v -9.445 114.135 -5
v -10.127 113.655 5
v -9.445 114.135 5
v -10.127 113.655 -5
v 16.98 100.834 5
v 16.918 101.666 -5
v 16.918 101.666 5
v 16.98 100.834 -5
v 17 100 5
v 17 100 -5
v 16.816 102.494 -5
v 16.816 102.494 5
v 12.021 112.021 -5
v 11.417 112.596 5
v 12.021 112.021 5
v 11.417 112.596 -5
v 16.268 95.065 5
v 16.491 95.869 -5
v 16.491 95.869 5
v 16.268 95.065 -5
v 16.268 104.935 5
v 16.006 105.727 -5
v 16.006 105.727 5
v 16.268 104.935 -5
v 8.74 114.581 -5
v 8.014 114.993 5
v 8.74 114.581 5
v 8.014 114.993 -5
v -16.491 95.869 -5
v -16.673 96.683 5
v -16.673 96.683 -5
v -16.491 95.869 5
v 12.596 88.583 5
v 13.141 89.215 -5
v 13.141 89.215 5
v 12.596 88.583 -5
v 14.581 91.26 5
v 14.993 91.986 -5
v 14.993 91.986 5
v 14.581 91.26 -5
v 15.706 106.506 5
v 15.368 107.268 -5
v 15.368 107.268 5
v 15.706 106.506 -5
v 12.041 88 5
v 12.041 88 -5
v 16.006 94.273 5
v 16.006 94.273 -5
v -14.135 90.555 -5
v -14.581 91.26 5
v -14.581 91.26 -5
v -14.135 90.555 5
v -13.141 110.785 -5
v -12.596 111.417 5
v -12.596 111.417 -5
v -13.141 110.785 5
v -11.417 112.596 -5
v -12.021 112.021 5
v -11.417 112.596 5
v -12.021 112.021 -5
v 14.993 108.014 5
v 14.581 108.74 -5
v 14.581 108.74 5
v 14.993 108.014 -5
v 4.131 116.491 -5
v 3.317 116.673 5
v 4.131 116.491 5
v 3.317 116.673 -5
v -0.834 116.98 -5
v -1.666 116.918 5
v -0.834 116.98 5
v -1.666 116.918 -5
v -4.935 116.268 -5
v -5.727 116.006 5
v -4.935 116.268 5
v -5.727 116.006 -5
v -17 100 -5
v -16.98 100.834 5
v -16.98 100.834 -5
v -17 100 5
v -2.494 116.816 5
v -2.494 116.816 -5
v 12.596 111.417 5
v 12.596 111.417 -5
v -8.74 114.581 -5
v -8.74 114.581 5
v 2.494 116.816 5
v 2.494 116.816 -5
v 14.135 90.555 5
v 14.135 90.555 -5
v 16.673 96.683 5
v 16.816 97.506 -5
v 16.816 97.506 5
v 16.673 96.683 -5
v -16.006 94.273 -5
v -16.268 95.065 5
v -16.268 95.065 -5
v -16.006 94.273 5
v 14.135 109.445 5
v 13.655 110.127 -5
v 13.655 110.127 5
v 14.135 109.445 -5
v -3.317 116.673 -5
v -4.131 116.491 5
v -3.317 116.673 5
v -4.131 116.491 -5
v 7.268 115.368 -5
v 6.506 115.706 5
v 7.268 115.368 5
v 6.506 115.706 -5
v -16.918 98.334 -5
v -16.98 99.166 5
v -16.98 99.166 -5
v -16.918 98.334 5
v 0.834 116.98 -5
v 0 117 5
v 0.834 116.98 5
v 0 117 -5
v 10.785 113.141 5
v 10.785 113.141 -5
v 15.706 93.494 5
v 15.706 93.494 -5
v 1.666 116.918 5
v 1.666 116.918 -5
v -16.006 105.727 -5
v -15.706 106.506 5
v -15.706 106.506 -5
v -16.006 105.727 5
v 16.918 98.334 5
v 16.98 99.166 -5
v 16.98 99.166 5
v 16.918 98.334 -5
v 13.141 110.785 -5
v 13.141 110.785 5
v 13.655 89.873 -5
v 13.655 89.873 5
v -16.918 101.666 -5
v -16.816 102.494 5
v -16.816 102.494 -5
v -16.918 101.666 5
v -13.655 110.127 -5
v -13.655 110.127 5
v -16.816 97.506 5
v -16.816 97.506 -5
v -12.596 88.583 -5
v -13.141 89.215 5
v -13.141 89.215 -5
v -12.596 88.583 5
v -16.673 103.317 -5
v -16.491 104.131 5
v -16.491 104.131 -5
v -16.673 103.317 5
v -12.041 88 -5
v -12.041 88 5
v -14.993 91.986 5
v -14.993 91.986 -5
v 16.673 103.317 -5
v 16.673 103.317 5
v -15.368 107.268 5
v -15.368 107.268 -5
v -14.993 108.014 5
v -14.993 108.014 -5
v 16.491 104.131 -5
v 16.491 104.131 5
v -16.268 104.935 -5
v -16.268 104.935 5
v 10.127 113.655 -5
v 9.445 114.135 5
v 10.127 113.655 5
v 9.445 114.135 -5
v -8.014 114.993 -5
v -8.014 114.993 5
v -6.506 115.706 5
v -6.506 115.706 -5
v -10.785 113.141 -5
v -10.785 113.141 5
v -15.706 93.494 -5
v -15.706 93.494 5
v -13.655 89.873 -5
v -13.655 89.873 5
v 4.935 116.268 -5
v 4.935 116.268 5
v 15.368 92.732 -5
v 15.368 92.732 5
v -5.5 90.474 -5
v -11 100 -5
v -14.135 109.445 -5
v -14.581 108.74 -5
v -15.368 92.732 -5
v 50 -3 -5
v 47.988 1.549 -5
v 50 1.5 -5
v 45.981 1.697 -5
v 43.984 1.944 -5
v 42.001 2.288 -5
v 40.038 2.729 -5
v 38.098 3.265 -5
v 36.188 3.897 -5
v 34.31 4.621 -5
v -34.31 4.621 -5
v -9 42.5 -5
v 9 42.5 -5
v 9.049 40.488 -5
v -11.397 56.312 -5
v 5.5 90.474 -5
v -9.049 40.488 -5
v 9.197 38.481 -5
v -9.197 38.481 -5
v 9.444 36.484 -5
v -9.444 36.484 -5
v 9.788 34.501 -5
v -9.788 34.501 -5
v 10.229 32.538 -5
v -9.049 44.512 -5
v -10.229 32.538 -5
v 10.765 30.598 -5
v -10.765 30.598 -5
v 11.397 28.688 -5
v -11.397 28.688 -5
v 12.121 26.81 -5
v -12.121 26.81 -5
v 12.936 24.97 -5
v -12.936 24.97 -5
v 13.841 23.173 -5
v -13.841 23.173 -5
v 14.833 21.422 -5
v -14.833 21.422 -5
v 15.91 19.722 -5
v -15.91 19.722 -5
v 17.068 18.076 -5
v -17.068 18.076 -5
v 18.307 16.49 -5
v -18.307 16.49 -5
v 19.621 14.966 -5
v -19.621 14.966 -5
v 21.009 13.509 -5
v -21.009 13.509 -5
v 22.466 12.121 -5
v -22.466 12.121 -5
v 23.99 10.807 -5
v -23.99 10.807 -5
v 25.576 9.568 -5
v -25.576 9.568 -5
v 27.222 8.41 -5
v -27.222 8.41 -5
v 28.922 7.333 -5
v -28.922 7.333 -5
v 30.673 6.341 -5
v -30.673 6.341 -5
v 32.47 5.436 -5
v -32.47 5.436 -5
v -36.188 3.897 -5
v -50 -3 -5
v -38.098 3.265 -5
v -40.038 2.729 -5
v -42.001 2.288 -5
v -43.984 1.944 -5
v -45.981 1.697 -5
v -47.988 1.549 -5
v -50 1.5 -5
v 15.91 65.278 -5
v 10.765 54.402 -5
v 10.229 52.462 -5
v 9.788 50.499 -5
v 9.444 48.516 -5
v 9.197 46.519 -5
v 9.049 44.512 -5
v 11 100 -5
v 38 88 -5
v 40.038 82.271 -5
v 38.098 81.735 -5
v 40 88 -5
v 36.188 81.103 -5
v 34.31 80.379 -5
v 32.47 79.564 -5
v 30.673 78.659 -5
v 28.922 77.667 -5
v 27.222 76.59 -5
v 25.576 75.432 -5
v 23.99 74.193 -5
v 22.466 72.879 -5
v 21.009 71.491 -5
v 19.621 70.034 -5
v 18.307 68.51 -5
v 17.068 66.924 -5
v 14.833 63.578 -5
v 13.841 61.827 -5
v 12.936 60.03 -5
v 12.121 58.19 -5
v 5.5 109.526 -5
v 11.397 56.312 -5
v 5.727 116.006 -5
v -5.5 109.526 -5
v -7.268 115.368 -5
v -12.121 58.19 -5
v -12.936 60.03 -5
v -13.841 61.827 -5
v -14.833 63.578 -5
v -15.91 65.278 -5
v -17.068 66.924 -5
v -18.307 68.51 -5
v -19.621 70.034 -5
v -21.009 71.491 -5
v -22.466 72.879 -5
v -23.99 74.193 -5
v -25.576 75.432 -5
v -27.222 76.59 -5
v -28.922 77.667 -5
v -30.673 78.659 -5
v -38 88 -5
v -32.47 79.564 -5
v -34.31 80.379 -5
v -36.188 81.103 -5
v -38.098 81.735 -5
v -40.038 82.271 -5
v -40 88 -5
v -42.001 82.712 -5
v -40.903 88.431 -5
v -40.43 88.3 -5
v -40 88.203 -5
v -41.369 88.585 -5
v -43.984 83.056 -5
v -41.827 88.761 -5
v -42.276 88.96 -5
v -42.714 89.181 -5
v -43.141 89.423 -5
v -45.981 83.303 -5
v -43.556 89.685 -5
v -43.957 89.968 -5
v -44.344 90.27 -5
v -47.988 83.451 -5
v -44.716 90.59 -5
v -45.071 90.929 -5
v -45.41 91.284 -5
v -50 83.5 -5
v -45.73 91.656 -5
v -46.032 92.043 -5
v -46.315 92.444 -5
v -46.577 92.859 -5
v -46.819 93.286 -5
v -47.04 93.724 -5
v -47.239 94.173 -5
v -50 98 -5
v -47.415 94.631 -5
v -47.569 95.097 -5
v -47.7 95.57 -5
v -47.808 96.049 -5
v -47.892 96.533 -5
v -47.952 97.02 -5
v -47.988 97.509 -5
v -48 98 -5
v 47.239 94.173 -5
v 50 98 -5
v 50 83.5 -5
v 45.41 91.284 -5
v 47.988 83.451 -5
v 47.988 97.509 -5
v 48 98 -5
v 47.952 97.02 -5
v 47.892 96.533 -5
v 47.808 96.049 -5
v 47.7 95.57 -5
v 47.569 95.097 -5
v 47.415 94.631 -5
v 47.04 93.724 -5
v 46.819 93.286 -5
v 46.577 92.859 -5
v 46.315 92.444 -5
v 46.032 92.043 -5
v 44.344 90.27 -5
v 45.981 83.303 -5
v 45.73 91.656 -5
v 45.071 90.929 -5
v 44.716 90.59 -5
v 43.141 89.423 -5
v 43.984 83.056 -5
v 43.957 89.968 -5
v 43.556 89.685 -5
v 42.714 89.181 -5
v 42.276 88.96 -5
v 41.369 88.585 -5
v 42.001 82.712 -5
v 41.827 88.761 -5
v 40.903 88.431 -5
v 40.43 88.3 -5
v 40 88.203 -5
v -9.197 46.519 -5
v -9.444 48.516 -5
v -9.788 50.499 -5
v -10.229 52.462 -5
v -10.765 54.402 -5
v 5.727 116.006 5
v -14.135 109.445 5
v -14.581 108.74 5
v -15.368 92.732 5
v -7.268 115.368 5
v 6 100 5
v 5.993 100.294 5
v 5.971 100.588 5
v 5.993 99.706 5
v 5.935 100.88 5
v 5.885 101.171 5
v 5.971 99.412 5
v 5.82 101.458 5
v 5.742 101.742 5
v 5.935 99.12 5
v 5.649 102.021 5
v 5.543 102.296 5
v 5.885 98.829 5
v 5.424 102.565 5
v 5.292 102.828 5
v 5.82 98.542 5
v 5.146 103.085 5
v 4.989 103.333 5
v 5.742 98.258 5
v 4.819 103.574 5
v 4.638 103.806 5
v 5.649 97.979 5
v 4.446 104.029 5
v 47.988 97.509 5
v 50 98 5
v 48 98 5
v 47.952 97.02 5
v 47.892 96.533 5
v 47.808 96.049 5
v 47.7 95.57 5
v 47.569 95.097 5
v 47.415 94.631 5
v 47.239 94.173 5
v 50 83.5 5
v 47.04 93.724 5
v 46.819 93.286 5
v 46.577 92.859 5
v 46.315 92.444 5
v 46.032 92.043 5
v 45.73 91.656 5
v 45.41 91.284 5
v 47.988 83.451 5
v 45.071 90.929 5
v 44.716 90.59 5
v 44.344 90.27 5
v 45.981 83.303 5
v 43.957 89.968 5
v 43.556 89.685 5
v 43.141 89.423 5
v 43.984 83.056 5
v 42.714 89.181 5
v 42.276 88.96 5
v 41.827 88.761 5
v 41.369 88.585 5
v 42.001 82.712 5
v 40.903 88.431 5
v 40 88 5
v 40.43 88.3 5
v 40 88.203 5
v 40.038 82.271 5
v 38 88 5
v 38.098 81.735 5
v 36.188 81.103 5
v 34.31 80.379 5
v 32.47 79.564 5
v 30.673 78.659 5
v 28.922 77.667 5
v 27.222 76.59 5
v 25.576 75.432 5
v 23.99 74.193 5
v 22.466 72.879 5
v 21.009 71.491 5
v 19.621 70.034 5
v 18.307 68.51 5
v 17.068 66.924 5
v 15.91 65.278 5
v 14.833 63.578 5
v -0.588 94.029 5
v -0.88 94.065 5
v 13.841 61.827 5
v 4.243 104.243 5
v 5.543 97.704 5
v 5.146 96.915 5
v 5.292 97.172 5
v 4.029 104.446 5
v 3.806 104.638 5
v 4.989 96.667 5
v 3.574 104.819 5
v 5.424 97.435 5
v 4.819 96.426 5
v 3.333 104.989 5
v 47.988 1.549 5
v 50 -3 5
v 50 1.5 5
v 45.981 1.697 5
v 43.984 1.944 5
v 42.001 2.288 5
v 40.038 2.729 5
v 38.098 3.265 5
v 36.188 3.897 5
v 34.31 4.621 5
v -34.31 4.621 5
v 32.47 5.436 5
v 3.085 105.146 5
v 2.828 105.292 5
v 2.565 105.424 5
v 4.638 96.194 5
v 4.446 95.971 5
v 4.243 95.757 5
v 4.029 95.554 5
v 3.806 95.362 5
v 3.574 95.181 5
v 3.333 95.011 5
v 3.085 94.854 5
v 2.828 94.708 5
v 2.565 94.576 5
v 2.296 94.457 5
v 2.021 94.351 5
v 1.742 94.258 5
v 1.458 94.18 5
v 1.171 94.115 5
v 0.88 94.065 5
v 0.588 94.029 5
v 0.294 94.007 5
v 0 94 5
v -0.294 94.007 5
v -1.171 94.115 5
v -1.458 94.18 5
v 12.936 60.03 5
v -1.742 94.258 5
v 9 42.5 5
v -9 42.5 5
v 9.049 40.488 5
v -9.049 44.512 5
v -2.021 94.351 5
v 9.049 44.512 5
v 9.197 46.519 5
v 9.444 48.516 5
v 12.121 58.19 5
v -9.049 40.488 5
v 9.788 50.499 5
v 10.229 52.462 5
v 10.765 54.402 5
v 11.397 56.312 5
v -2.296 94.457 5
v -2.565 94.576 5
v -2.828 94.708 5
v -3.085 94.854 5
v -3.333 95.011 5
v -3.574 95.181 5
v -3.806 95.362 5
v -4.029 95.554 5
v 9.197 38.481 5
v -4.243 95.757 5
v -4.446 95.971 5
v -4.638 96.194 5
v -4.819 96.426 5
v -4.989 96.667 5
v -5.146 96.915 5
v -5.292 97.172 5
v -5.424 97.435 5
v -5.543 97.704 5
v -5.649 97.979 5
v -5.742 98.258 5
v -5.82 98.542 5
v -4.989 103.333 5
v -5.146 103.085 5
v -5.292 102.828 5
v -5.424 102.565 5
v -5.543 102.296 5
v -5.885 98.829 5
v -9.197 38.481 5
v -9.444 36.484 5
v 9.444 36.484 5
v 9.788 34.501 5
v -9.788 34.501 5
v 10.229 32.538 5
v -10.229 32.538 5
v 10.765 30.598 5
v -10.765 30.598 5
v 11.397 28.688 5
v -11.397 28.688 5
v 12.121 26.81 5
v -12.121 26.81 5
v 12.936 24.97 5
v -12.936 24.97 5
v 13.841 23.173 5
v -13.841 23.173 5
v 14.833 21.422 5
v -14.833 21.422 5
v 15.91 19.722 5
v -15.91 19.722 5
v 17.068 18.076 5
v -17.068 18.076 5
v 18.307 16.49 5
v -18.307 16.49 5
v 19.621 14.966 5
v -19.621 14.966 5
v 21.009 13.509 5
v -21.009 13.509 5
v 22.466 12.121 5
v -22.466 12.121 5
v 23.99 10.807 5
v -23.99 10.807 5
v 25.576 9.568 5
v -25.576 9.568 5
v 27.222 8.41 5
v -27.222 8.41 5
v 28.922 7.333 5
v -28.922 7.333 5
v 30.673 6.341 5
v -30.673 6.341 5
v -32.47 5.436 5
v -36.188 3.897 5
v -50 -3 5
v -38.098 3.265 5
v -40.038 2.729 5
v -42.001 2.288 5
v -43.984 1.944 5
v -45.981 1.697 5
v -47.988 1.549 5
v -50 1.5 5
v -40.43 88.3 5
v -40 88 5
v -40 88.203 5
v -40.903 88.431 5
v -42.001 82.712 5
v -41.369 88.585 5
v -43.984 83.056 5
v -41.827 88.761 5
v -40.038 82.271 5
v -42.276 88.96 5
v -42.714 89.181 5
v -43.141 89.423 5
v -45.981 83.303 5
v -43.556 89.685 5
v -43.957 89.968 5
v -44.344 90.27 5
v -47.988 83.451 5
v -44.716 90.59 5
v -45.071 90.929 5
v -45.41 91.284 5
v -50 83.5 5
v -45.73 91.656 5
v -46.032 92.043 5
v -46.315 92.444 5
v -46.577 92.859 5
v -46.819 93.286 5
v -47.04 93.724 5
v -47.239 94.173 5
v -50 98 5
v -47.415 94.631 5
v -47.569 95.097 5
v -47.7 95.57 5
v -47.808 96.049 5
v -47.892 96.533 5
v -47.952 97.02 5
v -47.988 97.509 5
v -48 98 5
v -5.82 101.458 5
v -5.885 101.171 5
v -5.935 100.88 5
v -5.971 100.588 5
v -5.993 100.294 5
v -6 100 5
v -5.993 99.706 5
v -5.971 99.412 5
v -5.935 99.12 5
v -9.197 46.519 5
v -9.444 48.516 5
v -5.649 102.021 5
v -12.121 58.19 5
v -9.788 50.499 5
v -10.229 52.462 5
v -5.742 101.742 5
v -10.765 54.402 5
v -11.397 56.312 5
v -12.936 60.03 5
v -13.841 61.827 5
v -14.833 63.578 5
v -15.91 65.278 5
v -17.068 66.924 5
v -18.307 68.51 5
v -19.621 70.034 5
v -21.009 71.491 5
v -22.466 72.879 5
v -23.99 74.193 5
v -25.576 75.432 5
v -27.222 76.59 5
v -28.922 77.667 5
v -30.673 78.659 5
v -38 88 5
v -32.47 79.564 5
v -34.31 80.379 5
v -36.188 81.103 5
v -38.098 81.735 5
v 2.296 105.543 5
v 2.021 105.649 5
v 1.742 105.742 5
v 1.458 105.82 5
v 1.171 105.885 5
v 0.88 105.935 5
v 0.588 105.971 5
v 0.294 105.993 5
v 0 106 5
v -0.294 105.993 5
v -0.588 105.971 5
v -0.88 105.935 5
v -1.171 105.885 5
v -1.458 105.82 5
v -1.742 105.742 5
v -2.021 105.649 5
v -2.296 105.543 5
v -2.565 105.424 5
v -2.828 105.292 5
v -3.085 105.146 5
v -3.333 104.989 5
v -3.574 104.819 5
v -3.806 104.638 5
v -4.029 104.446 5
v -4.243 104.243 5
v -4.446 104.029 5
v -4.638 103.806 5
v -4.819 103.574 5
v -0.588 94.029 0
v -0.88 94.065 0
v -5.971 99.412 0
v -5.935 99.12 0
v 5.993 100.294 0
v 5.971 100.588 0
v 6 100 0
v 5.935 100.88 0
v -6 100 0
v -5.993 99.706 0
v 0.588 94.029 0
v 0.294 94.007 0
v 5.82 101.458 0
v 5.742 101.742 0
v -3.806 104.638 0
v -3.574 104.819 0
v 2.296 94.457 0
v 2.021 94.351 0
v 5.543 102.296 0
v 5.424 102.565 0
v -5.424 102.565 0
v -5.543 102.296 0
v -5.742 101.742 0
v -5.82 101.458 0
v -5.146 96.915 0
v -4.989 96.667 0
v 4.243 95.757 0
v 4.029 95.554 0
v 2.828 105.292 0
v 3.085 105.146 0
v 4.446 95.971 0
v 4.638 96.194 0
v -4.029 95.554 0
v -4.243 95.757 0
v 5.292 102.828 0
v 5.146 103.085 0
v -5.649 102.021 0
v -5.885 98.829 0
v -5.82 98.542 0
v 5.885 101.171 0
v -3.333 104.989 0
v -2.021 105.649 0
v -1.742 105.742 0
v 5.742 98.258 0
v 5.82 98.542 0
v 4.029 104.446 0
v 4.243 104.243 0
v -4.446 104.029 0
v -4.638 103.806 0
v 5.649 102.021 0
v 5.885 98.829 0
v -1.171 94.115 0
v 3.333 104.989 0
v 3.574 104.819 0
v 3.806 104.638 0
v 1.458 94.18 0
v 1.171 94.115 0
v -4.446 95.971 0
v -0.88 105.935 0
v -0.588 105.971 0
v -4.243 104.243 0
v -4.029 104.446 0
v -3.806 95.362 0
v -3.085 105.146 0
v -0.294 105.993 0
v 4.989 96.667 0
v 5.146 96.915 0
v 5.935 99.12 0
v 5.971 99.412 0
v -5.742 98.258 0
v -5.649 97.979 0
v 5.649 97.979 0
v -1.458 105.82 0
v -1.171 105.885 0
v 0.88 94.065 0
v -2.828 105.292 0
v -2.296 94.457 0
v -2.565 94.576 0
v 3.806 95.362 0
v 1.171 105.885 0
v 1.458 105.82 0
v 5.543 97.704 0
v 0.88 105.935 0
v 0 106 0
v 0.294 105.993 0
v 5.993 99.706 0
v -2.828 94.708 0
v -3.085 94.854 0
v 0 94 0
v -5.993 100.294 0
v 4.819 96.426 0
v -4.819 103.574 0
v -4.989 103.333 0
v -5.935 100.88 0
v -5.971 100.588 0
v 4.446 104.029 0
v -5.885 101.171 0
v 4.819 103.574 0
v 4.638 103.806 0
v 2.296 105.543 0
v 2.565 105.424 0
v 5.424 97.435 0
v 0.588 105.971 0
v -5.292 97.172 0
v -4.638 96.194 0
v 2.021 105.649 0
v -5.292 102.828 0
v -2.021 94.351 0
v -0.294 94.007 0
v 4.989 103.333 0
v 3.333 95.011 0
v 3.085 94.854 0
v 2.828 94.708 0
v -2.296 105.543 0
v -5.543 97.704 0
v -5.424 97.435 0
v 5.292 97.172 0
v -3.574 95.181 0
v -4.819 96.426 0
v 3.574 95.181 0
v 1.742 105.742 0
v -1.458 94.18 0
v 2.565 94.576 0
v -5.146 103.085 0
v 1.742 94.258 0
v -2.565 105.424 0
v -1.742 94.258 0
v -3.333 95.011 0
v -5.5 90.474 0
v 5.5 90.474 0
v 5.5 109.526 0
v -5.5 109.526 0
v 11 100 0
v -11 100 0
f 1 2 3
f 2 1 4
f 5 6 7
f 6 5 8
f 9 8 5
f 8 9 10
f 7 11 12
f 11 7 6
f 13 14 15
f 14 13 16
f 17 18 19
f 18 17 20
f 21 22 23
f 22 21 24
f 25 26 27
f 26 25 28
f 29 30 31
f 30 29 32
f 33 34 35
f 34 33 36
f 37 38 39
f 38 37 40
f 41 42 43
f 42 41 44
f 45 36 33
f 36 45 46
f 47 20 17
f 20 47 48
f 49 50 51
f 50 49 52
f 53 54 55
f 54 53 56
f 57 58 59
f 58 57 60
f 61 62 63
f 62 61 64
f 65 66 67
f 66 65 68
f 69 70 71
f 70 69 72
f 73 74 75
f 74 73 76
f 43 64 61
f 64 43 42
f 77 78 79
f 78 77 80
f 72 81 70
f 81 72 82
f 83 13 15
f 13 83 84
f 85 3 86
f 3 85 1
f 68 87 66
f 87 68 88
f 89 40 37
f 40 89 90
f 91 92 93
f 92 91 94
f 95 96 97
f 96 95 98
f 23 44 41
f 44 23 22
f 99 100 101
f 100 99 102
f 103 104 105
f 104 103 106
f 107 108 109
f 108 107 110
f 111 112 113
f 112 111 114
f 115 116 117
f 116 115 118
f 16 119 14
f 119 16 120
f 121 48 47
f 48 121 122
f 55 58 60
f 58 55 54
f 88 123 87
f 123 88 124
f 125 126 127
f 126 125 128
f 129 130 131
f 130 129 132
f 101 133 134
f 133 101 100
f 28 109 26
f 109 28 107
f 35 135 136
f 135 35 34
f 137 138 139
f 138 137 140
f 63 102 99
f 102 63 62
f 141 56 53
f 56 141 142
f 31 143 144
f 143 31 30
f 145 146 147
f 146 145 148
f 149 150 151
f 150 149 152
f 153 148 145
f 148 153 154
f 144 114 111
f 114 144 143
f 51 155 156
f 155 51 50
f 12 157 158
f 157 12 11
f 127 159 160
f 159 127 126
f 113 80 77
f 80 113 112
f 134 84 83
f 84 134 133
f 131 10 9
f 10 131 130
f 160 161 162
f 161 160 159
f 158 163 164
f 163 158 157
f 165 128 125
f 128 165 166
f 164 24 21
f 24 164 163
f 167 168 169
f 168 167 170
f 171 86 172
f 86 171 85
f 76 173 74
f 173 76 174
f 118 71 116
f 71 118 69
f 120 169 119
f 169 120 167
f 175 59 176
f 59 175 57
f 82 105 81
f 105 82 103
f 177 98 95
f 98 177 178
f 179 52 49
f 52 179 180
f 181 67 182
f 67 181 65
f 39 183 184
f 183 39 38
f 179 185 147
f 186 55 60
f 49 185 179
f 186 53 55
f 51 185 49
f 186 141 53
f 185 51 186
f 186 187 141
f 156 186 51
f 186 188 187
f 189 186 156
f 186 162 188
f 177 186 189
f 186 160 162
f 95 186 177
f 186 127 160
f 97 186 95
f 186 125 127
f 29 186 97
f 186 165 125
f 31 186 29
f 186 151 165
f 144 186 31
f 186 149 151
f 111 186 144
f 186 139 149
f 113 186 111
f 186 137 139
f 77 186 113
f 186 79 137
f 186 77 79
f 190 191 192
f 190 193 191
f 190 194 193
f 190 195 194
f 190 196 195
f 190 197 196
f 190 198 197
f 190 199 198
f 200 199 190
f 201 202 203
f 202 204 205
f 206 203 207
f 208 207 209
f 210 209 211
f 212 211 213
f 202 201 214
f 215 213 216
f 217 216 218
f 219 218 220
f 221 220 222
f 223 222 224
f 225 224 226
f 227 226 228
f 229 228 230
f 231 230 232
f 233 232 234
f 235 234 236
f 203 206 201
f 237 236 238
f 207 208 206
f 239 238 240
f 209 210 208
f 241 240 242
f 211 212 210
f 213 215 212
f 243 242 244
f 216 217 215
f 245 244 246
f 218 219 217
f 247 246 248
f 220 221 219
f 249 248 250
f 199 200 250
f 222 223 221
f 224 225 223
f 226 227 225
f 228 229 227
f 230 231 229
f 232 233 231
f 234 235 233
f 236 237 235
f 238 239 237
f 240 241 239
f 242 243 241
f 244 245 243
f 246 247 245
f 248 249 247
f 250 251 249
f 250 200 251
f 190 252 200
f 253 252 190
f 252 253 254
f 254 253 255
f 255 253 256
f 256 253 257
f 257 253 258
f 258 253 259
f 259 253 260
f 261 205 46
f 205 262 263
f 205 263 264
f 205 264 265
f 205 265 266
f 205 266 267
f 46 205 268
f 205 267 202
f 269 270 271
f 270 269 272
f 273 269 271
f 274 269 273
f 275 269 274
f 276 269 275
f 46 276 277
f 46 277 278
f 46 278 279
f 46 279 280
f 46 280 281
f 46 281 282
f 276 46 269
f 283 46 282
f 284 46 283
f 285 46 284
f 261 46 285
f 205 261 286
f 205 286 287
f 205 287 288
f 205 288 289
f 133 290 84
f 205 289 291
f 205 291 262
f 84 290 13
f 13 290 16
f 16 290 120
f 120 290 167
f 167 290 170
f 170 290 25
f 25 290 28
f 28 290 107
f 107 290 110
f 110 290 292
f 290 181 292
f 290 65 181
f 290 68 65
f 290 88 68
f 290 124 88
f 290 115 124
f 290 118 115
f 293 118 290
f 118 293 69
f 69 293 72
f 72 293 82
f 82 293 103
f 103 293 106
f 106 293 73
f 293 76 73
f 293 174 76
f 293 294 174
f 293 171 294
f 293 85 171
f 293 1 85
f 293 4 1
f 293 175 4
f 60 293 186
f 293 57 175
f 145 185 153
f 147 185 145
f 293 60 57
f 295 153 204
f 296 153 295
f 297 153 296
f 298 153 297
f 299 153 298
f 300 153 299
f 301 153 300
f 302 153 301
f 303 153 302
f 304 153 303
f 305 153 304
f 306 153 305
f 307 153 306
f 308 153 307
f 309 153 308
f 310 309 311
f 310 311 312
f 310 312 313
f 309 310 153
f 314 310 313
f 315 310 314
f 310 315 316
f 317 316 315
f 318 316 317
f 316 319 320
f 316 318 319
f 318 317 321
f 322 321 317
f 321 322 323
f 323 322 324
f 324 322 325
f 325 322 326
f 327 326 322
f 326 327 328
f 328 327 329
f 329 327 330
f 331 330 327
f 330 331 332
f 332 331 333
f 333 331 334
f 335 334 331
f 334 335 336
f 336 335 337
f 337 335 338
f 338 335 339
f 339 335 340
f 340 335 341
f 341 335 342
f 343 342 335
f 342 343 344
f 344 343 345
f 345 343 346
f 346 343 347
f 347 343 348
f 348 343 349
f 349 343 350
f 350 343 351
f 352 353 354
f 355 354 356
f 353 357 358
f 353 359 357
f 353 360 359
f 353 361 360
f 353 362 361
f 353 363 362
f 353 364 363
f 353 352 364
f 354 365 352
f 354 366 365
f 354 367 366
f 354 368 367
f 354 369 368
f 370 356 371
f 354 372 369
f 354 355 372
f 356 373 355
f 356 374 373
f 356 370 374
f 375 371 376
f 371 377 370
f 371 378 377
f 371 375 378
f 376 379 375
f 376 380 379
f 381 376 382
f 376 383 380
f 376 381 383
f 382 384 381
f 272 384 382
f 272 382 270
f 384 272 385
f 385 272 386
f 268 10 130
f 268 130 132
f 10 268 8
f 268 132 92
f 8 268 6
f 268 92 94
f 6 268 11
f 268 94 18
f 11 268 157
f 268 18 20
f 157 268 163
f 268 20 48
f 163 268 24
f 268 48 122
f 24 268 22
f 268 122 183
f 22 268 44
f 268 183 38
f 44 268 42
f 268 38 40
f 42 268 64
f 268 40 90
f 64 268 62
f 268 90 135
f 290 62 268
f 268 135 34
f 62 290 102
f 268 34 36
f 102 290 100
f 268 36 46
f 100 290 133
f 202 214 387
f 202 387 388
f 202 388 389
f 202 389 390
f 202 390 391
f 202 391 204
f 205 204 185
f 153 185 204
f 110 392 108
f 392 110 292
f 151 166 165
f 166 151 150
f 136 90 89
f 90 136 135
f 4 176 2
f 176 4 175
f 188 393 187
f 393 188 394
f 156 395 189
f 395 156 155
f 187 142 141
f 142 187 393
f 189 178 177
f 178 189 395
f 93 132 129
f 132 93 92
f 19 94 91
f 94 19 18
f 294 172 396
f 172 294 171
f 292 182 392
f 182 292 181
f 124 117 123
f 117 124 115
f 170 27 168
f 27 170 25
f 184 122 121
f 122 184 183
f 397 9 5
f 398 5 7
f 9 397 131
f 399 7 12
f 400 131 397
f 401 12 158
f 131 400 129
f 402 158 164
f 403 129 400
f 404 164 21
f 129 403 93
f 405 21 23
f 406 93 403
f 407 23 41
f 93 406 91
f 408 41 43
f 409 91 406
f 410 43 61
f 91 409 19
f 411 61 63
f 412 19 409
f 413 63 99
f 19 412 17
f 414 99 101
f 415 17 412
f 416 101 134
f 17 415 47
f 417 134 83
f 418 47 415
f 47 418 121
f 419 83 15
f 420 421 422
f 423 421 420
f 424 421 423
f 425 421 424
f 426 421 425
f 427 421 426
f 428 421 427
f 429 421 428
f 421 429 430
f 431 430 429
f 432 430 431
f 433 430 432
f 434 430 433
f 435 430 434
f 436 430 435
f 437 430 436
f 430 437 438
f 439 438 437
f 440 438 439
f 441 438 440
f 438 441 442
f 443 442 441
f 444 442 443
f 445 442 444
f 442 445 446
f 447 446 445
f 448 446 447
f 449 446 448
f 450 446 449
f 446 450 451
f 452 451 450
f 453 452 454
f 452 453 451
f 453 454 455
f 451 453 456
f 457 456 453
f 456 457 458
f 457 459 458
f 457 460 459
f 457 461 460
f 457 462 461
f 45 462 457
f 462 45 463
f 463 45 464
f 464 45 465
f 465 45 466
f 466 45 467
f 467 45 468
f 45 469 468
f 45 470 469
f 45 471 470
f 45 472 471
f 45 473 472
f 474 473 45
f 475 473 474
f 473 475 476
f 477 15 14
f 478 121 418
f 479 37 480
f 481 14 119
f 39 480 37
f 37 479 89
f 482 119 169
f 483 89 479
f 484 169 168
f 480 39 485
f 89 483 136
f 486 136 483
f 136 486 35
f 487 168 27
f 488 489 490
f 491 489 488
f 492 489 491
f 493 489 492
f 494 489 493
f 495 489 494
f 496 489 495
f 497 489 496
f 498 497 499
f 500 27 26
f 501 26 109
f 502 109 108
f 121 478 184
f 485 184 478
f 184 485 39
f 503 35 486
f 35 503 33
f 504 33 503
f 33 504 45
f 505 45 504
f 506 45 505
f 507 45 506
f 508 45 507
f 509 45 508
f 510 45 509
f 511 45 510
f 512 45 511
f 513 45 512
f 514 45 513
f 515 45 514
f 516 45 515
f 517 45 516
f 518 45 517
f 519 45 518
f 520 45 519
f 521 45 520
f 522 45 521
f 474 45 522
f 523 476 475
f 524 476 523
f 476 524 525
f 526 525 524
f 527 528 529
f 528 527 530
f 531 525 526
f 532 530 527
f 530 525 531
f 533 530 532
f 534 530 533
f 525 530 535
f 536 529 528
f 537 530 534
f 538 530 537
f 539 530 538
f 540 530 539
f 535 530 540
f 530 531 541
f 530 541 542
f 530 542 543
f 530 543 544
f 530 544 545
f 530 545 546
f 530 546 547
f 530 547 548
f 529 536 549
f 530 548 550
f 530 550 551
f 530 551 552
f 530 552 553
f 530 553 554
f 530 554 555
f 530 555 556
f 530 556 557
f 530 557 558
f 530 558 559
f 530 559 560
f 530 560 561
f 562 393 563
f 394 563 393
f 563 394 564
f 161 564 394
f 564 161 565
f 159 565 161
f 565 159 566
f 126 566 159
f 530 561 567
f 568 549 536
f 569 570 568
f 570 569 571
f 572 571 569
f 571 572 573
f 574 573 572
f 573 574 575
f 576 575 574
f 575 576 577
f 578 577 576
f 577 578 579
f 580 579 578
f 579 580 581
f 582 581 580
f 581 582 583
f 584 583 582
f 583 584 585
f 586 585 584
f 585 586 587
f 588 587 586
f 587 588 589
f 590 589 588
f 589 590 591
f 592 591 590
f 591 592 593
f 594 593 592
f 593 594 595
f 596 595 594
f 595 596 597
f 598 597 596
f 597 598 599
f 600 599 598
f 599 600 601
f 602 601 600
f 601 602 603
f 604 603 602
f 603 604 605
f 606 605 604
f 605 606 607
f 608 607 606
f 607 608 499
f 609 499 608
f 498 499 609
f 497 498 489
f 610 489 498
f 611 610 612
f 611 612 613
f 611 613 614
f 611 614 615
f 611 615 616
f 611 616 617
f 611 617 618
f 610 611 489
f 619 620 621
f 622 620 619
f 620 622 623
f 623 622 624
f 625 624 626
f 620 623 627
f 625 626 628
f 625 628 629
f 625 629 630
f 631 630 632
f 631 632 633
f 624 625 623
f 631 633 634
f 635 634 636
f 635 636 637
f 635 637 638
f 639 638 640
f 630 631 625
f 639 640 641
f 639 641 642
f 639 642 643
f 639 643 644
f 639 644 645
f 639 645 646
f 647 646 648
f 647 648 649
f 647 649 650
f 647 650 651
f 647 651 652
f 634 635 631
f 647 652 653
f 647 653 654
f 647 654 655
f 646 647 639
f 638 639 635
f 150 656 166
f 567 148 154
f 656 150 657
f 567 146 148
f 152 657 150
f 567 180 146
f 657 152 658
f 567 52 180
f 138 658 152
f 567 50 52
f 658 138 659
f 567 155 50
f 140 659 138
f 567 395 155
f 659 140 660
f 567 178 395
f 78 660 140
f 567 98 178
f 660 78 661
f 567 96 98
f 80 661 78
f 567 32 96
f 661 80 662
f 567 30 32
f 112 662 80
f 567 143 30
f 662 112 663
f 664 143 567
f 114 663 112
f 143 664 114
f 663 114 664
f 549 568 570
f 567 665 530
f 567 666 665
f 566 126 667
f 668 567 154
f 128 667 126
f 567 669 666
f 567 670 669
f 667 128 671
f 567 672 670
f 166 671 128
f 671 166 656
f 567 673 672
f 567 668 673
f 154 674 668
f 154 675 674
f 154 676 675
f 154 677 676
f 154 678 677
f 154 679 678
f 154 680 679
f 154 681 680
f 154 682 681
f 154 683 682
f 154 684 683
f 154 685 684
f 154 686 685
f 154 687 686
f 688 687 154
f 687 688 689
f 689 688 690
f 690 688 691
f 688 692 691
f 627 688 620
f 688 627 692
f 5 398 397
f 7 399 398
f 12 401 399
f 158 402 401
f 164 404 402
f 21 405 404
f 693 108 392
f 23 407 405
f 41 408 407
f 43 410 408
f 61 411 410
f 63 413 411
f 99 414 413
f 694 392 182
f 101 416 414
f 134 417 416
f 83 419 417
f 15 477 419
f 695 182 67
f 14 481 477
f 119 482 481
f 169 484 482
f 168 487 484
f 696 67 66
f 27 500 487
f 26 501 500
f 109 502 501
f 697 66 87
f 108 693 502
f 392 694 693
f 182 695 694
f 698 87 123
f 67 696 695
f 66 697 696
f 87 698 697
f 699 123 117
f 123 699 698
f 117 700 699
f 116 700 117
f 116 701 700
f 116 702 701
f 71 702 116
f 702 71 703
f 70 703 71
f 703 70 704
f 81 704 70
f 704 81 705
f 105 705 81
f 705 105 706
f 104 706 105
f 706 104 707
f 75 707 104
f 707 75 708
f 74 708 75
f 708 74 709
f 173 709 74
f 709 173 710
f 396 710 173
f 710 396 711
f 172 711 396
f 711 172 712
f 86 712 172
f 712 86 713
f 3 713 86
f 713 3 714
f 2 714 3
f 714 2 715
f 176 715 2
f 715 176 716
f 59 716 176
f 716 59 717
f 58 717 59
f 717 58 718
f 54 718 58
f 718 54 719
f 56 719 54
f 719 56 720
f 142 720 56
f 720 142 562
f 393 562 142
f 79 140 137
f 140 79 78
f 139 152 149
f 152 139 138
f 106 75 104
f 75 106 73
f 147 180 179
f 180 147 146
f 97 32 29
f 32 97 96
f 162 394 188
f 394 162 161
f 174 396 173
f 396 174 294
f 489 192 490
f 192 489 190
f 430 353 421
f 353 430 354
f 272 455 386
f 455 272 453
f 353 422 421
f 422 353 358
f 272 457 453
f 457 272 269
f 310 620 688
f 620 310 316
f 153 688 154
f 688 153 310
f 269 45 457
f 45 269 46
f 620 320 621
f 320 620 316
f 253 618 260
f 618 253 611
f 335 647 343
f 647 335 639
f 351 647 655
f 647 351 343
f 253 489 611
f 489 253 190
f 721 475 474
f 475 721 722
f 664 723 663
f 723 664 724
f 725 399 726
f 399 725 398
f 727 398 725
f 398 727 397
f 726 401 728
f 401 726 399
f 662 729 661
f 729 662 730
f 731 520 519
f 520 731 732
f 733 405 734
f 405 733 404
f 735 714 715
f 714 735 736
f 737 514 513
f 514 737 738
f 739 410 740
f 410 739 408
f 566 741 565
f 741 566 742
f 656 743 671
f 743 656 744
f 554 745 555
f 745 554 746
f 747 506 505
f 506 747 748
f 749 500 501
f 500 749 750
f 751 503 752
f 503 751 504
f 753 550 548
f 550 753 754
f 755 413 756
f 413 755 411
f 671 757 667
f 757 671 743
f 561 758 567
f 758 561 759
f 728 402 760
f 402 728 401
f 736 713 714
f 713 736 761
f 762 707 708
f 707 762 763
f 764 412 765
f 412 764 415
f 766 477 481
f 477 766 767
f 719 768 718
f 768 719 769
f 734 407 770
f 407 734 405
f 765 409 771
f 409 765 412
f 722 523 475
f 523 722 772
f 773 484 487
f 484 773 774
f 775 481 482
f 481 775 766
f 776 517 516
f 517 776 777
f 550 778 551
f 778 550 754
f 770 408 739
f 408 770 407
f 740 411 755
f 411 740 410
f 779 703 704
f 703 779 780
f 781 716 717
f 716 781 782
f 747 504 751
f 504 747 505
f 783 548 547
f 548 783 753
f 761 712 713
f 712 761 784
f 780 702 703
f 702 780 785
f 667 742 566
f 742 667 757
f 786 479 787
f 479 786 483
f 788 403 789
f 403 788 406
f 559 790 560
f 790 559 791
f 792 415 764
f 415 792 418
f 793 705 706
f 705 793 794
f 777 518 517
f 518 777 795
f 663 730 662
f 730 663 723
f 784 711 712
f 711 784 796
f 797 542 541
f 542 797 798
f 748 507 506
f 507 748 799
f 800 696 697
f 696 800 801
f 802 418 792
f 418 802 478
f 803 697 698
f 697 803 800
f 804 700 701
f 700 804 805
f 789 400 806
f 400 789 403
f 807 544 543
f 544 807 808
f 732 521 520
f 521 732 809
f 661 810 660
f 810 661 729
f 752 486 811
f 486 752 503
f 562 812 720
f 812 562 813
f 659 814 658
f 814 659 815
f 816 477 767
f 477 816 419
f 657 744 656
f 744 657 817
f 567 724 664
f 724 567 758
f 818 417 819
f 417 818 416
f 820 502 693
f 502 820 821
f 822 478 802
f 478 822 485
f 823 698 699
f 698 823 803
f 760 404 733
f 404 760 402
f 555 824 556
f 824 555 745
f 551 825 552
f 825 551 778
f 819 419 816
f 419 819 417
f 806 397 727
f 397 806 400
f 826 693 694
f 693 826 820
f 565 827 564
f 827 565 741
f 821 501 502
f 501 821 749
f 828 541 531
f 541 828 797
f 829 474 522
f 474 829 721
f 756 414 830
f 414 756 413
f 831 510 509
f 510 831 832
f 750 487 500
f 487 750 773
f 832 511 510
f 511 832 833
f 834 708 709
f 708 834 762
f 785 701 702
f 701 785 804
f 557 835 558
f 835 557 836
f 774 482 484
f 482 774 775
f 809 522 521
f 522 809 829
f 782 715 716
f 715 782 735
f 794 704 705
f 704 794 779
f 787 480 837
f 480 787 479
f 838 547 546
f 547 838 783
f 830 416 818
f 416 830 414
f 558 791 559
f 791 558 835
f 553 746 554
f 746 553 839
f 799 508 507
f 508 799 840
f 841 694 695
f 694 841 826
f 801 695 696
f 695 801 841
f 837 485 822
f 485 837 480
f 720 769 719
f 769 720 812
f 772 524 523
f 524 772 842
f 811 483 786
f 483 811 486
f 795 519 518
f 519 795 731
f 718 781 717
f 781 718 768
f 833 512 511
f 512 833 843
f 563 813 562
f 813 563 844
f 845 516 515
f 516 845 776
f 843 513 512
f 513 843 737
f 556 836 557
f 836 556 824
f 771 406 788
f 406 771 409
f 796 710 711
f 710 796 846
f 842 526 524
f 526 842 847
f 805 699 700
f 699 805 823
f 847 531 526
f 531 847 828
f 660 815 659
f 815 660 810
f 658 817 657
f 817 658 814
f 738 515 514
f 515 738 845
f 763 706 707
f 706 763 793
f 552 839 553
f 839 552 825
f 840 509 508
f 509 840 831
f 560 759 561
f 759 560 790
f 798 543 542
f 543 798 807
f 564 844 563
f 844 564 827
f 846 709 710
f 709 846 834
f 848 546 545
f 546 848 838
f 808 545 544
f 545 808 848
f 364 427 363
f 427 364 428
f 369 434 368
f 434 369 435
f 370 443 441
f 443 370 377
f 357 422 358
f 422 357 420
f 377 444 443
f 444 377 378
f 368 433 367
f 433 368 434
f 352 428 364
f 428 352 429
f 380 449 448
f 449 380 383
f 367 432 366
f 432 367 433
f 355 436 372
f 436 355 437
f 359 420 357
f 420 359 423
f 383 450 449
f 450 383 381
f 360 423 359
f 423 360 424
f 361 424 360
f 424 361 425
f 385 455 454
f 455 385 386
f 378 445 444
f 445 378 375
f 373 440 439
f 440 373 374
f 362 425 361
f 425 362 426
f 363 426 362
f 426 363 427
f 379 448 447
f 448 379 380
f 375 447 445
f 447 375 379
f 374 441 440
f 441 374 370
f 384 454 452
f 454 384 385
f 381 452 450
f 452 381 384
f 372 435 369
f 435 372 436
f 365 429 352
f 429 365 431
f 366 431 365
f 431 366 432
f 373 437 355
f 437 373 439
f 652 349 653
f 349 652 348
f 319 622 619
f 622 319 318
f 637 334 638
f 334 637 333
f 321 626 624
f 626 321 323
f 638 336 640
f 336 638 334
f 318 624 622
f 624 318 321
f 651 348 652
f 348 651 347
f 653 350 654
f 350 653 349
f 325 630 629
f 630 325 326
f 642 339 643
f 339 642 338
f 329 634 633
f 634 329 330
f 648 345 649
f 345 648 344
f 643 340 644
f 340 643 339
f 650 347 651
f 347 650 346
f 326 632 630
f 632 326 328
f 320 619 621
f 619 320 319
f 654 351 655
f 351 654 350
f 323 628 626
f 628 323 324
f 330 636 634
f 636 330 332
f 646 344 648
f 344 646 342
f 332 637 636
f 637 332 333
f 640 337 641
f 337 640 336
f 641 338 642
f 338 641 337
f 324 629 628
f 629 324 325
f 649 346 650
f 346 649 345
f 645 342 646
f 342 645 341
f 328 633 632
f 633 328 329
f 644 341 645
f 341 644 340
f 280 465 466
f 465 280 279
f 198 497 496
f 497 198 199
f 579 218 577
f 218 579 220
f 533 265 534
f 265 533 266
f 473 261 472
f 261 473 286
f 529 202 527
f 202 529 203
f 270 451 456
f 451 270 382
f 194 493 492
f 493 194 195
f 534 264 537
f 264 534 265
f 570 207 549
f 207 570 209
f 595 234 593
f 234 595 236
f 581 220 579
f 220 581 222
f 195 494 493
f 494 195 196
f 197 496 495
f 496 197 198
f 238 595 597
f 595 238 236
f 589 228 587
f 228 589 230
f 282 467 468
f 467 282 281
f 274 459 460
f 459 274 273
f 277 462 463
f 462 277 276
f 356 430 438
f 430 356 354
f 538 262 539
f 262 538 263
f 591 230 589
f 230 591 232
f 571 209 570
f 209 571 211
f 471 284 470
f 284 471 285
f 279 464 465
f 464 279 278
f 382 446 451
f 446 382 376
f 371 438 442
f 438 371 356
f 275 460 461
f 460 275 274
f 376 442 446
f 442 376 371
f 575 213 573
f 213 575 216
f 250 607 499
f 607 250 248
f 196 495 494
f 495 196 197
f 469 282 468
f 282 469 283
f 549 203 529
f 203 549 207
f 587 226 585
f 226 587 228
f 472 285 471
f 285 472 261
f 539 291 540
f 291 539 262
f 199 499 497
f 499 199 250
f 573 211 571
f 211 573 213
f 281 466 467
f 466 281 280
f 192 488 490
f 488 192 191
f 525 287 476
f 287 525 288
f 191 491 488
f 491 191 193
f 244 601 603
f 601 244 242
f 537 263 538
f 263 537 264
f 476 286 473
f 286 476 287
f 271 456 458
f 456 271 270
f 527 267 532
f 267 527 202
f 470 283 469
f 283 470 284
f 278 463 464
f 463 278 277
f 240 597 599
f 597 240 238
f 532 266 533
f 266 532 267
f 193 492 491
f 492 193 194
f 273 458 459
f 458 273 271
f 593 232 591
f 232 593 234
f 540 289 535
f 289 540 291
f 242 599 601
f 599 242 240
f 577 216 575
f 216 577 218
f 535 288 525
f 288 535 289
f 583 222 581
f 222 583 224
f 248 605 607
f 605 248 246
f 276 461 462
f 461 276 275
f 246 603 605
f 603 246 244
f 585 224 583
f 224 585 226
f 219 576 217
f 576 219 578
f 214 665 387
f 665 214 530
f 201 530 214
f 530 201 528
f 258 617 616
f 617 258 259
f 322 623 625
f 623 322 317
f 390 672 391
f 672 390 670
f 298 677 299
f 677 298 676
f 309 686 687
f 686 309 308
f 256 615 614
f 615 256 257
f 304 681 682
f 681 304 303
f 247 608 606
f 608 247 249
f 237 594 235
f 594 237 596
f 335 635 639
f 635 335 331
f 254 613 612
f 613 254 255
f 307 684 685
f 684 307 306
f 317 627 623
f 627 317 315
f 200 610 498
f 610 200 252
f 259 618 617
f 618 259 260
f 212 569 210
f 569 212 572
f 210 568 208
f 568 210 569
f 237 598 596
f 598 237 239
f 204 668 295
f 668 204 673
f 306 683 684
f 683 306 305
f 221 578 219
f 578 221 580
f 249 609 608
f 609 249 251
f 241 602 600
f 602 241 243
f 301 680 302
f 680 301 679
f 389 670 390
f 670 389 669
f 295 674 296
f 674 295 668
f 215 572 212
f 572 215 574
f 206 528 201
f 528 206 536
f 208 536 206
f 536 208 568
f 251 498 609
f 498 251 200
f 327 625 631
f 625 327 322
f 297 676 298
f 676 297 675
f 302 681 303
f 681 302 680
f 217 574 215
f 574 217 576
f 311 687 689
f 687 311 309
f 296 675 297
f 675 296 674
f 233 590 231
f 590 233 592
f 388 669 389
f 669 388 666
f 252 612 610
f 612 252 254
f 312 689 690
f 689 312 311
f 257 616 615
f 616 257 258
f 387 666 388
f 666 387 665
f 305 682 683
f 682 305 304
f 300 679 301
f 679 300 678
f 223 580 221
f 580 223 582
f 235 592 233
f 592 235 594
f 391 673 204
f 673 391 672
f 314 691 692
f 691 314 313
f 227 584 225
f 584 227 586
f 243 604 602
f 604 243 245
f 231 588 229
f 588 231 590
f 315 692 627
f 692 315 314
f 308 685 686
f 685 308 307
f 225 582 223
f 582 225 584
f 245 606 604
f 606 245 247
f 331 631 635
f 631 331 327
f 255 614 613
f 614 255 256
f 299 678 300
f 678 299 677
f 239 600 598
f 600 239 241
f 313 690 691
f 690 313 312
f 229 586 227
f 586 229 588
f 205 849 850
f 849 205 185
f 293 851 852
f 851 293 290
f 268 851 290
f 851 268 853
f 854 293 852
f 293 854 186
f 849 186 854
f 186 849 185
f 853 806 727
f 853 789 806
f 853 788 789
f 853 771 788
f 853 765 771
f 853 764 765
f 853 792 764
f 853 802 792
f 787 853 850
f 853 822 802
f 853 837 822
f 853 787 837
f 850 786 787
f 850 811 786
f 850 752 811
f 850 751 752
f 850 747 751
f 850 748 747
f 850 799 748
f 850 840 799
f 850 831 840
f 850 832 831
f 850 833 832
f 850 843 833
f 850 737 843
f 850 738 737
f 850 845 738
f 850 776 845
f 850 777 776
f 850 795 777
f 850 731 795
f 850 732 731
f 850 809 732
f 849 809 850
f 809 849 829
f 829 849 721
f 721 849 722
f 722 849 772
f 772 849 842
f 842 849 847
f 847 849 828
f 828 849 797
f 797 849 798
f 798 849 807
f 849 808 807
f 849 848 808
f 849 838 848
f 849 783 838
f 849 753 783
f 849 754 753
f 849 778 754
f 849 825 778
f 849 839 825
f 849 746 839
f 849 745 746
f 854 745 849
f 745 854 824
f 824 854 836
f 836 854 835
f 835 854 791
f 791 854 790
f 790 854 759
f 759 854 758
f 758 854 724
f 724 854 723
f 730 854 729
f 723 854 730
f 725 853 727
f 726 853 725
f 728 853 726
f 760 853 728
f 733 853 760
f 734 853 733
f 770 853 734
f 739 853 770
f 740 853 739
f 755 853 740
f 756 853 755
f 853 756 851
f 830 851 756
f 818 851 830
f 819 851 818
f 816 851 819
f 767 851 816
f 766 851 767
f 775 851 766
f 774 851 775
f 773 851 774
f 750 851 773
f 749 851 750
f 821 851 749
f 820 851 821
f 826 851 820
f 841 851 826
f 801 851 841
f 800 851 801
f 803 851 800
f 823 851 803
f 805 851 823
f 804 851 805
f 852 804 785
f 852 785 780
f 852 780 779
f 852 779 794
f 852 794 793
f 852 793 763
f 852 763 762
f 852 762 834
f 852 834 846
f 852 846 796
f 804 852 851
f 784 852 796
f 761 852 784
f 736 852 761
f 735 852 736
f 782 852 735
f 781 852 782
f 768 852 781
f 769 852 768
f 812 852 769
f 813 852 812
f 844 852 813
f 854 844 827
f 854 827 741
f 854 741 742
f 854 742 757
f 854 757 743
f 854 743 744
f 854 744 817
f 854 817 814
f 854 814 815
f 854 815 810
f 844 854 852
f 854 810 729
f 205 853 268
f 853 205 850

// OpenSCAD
a = 100;
rod_d = 12;
nut_d = 22;
nut_h = 10;
thickness = 6;
width = 10;

$fn= 128;

difference(){

union(){
	cube([a, thickness, width], center=true);
	translate([0, a, 0]){
		cylinder(d=nut_d + thickness*2, h=width, center=true);
		translate([a/2  - 5, -7, 0]) cube([10, 10, width], center=true);
		translate([-a/2  + 5, -7, 0]) cube([10, 10, width], center=true);
	}
	translate([0, (a-thickness*2)/2, 0]) cube([a, a - thickness*2, width], center=true);
}


translate([a/2, (a - thickness*2.5)/2, 0]) cylinder(d=a - thickness*3, h=width +2, center=true);
translate([-a/2, (a - thickness*2.5)/2, 0]) cylinder(d=a - thickness*3, h=width +2, center=true);


translate([0, a, -width/2]) cylinder(d=nut_d, h=nut_h, $fn=6, center=true);

translate([0, a, 0]){
	cylinder(d=rod_d, h=width + 2, center=true);
	translate([a/2  - 12, -2, 0]) cylinder(r=10, h=width+2, center=true);
	translate([-a/2  + 12, -2, 0]) cylinder(r=10, h=width+2, center=true);
}

}
